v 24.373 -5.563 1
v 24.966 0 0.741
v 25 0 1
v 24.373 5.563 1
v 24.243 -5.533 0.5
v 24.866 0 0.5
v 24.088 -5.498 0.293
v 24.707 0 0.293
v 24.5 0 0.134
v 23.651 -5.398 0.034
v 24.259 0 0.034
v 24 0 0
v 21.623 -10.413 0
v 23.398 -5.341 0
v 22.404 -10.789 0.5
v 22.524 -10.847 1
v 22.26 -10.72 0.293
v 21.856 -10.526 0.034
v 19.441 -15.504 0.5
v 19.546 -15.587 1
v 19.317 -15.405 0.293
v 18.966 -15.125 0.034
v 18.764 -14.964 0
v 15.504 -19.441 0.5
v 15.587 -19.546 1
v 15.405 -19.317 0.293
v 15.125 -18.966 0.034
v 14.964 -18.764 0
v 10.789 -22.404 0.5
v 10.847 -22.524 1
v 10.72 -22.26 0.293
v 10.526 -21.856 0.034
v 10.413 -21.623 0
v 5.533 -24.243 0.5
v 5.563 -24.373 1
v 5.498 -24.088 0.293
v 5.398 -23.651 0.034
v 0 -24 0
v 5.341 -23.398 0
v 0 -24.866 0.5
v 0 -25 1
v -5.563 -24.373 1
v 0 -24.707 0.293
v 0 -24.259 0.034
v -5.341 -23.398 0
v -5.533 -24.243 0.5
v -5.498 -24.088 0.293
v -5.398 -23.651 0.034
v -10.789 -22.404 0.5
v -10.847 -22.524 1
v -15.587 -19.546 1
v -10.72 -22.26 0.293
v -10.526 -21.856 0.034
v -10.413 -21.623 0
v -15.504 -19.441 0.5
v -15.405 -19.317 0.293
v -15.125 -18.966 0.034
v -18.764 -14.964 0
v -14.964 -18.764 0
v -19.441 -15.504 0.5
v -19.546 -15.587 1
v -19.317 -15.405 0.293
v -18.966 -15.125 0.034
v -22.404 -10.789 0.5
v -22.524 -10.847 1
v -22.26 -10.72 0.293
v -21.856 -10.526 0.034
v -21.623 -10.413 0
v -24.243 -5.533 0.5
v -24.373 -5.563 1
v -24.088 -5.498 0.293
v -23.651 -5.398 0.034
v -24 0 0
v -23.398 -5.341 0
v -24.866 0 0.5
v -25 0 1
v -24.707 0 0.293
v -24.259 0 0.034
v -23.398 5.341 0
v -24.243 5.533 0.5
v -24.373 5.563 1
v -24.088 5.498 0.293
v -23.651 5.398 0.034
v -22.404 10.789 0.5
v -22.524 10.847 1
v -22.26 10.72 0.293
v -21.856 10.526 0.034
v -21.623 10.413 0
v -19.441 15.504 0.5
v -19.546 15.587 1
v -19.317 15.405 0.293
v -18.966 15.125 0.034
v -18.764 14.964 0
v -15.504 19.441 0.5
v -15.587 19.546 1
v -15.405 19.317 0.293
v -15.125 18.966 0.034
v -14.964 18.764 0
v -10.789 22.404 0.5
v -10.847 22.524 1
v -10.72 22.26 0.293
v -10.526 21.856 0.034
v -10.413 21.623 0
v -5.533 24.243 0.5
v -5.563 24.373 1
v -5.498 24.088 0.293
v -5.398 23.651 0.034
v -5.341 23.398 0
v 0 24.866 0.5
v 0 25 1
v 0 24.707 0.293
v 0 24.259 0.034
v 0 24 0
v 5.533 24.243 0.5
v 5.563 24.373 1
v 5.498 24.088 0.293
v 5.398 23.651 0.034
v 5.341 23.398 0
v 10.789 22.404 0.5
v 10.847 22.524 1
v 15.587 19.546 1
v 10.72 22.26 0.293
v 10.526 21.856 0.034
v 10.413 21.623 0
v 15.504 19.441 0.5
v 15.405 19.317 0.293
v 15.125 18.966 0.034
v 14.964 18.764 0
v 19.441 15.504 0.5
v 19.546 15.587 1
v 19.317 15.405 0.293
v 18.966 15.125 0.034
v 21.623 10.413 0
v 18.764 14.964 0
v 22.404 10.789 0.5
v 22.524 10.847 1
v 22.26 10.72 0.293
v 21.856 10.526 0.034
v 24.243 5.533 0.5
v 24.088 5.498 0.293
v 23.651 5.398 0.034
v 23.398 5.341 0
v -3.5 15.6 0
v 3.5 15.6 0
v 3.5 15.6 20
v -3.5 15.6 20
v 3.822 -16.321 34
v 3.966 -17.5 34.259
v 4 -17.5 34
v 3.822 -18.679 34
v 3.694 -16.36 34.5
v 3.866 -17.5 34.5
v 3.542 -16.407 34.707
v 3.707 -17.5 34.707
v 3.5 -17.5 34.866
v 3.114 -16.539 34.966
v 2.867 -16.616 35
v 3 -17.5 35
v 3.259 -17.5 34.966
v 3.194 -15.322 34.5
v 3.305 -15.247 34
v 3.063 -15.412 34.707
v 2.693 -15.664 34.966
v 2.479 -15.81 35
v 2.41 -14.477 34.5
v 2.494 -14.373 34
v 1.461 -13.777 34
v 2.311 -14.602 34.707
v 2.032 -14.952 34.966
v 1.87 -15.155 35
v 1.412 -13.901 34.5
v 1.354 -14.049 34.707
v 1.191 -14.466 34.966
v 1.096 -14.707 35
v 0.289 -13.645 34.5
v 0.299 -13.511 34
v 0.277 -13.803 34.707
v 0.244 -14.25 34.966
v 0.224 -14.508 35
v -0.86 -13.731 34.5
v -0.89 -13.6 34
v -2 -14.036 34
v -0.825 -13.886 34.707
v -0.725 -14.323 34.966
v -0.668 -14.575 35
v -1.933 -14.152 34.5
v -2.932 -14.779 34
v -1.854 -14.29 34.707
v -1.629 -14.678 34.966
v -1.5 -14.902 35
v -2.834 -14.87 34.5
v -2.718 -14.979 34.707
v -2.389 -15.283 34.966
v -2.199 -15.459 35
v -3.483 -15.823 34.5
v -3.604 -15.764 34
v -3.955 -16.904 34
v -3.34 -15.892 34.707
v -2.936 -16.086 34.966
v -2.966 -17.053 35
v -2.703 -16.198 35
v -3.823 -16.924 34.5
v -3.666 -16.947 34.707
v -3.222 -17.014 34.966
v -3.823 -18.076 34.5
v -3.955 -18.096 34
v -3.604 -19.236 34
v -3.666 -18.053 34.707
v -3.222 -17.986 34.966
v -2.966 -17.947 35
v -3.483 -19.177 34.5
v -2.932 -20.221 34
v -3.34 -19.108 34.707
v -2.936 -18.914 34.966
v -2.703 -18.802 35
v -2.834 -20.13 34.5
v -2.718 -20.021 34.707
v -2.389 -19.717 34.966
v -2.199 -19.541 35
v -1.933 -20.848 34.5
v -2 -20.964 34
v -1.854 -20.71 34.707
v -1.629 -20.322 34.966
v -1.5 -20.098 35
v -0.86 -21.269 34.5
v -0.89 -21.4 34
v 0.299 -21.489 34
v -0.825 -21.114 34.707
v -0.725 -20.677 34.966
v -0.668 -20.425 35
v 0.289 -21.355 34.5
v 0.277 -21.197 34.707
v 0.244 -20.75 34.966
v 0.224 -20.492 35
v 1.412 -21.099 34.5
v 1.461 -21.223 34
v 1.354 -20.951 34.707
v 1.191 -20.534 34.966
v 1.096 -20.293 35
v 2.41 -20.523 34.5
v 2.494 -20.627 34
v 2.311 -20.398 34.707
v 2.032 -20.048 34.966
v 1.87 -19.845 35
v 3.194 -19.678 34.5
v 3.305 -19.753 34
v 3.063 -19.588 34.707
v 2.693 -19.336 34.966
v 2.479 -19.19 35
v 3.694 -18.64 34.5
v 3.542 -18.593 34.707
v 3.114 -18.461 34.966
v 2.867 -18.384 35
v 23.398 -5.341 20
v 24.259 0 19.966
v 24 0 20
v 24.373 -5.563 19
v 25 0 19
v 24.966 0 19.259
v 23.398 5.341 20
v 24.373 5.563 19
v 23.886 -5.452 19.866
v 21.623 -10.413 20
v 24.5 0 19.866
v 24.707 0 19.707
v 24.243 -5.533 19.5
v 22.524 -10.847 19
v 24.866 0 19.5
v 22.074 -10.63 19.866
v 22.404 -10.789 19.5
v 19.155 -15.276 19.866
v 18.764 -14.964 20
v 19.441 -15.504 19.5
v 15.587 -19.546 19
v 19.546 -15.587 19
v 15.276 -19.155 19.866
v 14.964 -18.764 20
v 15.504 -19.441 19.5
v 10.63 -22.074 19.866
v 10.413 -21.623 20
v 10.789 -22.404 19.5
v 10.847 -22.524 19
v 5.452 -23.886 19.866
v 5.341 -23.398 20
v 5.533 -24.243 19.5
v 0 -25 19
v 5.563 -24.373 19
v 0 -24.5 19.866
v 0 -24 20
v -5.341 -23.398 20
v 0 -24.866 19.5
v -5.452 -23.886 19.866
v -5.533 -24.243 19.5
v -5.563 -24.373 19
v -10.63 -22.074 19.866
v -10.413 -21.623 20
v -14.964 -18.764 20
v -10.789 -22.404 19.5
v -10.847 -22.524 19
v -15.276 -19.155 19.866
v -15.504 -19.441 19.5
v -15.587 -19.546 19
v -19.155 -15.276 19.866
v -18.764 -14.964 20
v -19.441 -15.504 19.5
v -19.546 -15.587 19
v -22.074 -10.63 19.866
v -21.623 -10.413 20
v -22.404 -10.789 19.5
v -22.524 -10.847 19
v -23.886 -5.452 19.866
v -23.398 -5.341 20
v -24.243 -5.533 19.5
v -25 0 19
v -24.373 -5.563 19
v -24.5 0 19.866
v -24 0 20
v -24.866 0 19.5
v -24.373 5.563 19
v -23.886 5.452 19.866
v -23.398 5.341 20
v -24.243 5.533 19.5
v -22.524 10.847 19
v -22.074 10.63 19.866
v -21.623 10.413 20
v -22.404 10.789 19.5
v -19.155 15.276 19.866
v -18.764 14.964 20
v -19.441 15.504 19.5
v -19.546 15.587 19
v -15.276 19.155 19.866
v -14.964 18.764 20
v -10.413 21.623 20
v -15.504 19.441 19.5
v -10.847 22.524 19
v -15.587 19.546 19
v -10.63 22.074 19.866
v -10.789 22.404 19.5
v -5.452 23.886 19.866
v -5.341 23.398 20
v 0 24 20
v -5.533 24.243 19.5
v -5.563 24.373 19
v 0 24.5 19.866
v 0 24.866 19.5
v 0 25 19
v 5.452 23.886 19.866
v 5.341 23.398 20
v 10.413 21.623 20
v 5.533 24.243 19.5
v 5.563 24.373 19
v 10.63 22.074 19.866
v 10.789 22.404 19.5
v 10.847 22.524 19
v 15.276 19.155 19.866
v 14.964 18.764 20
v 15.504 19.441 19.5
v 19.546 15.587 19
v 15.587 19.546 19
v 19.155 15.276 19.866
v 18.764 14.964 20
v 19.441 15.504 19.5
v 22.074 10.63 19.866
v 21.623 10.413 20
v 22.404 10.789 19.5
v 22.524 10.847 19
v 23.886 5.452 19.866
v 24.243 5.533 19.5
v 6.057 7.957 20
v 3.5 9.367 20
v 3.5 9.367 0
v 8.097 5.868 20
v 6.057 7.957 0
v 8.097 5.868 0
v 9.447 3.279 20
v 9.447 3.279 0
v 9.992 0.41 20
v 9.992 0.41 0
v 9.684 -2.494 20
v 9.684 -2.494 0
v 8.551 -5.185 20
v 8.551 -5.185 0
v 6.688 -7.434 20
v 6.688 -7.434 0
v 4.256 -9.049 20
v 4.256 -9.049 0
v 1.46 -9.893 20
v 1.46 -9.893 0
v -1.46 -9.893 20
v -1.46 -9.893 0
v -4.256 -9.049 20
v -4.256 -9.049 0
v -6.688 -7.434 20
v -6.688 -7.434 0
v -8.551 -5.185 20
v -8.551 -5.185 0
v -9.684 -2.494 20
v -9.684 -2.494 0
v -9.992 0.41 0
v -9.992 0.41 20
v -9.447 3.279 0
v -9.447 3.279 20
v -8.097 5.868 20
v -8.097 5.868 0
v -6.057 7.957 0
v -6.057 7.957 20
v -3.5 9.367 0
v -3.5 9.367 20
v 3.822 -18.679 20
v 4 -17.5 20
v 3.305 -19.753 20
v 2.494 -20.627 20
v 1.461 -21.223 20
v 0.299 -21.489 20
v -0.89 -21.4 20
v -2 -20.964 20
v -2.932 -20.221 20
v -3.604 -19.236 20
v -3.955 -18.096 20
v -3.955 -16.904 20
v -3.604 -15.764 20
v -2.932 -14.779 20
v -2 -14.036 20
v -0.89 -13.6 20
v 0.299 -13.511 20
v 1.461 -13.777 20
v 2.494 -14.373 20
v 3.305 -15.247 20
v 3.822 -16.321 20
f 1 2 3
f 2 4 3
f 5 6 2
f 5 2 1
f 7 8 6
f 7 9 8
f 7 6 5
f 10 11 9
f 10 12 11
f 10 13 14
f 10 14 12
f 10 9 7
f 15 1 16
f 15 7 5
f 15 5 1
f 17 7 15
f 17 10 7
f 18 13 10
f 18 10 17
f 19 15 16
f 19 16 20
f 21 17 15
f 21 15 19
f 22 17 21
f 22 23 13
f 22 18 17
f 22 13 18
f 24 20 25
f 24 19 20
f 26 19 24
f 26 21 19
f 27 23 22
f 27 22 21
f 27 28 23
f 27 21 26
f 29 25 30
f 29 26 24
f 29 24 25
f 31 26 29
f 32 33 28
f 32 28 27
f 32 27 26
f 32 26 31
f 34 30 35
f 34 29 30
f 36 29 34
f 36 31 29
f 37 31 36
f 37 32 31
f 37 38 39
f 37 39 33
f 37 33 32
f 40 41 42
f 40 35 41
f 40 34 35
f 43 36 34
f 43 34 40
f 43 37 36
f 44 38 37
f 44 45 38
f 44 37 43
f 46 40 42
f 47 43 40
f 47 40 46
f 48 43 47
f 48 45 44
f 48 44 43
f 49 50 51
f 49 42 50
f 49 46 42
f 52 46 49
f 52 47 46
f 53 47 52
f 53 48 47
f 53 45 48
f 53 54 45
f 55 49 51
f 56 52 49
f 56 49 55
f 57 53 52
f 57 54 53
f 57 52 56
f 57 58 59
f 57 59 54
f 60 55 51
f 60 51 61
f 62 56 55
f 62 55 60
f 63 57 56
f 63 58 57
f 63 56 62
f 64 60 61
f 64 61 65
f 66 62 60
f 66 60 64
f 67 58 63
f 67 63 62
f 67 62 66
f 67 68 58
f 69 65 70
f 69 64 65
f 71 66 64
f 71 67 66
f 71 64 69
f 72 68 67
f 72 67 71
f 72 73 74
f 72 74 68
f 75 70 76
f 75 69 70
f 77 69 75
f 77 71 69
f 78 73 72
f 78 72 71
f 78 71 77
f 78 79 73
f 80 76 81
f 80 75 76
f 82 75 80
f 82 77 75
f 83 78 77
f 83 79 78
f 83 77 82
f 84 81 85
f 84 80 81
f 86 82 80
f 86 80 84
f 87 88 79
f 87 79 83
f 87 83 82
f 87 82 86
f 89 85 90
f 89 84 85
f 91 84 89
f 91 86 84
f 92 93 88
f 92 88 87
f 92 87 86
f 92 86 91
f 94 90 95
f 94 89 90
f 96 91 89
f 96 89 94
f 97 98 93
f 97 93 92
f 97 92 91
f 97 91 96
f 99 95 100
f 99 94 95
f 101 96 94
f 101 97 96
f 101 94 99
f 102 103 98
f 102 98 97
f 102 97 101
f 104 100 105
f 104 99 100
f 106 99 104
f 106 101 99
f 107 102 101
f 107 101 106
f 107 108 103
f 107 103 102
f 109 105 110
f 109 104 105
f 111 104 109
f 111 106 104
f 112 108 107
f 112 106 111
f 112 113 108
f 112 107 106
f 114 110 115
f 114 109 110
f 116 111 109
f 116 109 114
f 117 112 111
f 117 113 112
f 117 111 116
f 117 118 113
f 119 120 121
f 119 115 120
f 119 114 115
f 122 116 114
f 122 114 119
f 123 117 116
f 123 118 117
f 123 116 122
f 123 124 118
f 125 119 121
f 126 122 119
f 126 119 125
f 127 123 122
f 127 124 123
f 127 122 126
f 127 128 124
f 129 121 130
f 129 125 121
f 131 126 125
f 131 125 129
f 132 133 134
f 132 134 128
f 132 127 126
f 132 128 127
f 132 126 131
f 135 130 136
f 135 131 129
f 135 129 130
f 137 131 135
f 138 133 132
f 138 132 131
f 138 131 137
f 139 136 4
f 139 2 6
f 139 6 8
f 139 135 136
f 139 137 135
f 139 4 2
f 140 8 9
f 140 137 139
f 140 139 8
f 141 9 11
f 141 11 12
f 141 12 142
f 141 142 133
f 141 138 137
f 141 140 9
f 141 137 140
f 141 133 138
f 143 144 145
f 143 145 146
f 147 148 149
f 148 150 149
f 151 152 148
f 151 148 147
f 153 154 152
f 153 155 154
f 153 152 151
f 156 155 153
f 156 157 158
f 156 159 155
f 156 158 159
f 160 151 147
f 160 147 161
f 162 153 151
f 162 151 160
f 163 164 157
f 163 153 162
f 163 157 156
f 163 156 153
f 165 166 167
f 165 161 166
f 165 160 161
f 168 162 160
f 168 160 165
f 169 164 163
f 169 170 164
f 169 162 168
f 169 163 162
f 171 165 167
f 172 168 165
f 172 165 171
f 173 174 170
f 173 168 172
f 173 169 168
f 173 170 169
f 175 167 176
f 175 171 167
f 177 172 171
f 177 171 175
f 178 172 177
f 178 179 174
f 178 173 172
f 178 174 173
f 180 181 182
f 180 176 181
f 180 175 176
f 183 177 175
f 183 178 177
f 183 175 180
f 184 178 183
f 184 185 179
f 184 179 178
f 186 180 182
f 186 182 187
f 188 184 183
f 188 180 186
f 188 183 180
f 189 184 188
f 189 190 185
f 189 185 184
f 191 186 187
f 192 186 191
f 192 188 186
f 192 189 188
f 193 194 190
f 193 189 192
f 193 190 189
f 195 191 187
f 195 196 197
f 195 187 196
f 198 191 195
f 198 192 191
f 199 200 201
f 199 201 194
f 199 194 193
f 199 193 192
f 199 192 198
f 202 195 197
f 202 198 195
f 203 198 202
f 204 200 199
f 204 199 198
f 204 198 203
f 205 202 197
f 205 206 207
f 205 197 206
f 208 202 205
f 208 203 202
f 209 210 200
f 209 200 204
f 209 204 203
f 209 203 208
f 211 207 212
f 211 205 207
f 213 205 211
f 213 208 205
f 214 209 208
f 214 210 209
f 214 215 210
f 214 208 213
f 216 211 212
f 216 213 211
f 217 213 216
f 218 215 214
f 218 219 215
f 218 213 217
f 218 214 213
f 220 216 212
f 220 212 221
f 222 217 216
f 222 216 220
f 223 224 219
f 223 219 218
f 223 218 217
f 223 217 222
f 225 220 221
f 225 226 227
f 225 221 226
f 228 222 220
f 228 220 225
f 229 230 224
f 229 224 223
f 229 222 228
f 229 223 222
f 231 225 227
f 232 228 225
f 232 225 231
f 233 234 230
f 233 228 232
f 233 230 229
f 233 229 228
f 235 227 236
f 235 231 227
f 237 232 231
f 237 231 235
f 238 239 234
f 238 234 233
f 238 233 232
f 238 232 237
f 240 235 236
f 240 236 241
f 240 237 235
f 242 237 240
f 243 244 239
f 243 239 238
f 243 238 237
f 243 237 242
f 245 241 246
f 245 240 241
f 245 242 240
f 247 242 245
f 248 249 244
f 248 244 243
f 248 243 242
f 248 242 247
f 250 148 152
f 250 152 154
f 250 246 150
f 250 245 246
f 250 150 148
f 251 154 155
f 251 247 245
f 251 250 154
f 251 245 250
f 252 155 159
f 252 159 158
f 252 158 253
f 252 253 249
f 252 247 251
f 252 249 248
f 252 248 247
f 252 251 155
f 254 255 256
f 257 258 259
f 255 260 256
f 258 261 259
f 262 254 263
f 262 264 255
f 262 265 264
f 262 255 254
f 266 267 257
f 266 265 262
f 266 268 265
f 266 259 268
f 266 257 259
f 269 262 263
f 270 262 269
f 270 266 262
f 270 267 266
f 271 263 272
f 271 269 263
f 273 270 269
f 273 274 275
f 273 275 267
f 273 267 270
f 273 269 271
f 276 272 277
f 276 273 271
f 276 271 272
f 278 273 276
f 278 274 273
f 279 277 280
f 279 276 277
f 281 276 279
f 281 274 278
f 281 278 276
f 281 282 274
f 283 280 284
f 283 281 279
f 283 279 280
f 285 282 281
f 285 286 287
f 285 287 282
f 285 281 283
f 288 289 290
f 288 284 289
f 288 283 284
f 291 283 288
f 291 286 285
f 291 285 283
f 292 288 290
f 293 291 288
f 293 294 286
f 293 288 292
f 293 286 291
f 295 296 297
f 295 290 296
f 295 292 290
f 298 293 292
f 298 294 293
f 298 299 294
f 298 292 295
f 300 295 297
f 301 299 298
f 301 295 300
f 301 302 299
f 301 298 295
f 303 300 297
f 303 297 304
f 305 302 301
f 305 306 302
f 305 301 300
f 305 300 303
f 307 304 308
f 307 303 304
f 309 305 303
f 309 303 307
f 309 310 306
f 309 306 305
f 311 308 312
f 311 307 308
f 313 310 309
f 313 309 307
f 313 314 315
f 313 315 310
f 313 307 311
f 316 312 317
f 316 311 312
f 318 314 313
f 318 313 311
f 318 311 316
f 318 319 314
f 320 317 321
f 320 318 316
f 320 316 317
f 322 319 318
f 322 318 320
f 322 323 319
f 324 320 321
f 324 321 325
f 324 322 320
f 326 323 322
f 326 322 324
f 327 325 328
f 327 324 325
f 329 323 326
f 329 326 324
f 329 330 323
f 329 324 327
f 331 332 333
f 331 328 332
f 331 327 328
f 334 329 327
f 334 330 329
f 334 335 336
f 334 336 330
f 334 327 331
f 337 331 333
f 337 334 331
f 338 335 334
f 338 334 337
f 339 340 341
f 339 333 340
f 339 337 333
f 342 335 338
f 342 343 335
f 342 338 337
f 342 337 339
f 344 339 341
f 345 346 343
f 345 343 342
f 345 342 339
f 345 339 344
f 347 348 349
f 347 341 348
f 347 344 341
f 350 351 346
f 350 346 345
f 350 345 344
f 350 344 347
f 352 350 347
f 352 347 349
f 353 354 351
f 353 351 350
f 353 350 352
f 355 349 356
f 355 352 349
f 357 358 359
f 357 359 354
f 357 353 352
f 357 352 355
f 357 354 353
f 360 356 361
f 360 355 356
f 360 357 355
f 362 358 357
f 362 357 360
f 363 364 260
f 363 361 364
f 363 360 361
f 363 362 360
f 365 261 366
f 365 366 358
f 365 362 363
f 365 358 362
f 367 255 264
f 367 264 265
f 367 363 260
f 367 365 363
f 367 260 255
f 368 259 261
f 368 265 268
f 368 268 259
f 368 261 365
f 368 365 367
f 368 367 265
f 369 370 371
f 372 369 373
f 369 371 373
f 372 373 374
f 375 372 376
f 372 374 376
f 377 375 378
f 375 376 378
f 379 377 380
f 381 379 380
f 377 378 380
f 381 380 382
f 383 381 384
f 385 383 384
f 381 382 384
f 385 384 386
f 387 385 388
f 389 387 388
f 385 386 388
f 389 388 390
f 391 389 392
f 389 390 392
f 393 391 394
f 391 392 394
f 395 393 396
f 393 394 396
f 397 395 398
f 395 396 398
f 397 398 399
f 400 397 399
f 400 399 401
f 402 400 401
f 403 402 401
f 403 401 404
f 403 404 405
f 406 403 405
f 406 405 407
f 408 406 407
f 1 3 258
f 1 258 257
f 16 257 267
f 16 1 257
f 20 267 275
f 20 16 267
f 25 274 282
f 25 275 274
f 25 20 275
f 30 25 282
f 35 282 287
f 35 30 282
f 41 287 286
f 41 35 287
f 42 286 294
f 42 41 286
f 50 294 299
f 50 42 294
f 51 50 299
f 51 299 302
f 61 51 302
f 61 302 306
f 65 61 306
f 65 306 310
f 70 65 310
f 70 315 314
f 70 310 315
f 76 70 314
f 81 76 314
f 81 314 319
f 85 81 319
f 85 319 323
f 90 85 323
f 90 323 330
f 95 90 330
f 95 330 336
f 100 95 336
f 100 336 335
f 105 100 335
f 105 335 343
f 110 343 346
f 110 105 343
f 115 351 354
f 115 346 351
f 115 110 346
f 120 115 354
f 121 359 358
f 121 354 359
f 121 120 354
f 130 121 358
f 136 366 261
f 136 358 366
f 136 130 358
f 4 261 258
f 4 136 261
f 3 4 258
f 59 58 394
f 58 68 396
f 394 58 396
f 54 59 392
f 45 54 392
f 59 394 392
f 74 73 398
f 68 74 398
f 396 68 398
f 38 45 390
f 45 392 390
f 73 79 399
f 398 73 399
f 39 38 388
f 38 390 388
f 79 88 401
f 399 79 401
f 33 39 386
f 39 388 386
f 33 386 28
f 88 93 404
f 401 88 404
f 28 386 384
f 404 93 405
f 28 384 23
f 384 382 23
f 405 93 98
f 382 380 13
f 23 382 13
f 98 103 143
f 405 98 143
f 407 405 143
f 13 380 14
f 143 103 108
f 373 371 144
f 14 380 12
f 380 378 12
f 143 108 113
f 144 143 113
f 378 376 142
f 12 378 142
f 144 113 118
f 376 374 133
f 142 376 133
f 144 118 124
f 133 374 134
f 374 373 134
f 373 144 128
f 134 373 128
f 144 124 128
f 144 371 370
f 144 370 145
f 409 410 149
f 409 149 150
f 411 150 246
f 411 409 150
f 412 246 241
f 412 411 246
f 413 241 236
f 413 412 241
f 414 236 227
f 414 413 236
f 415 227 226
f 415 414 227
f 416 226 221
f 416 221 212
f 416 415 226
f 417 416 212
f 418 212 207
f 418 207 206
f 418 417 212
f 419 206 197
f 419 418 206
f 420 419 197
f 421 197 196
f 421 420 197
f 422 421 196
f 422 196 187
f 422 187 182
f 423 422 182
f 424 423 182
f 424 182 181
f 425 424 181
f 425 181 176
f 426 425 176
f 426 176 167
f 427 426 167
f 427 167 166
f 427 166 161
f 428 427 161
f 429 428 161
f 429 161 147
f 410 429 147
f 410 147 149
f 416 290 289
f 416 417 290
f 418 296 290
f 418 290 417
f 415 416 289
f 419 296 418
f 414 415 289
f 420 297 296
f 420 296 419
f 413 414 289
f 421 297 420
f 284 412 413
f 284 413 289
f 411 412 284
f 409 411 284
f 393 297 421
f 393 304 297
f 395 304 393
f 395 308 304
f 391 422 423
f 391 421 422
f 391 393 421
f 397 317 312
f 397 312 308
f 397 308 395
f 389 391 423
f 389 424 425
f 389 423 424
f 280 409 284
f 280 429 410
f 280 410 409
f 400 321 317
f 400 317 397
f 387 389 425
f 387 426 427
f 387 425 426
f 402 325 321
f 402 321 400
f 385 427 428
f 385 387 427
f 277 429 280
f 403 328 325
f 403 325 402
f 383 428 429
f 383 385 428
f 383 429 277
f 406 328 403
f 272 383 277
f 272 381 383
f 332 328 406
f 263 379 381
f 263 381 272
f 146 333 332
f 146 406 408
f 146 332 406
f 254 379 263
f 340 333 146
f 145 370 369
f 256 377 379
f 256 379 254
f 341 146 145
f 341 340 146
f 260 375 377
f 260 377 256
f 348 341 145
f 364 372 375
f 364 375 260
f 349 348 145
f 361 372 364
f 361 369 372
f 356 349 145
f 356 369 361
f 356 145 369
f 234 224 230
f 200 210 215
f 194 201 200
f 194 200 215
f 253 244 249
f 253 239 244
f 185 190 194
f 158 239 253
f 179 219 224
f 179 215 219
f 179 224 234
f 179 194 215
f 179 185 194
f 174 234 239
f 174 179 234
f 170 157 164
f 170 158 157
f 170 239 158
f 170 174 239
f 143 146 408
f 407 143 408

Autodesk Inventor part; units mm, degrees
ref_plane "YZ Plane" through (0, 0, 0) normal (1, 0, 0) x (0, 1, 0)
ref_plane "XZ Plane" through (0, 0, 0) normal (0, 1, 0) x (-1, 0, 0)
ref_plane "XY Plane" through (0, 0, 0) normal (0, 0, 1) x (1, 0, 0)
sketch "Boceto1" plane through (0, 0, 0) normal (0, 0, 1) x (1, 0, 0)
  circle A0 centre (0, 0) radius 25
  circle A1 centre (0, 0) radius 10
  line L0 (0, -25) -> (0, -17.5)
  circle A2 centre (0, -17.5) radius 4
  dimension "d0" = 50
  dimension "d1" = 20
  dimension "d3" = 7.5
  dimension "d4" = 8
extrude "Extrusión1" add sketch "Boceto1" along normal blind 35 contours A2
extrude "Extrusión2" add sketch "Boceto1" along normal blind 20
fillet "Empalme1" radius 1 3 edges at (-25, 0, 0) (-25, 0, 20) (-4, -17.5, 35)
sketch "Boceto3" plane through (0, 0, 20) normal (0, 0, 1) x (1, 0, 0)
  line L0 (0, 15.6) -> (-3.5, 15.6)
  line L1 (-3.5, 15.6) -> (-3.5, 5.6)
  line L2 (-3.5, 5.6) -> (3.5, 5.6)
  line L3 (3.5, 5.6) -> (3.5, 15.6)
  line L4 (3.5, 15.6) -> (0, 15.6)
  point P0 (0, 0)
  dimension "d18" = 15.6
  dimension "d19" = 3.5
  dimension "d20" = 10
  dimension "d21" = 7
extrude "Extrusión4" cut sketch "Boceto3" against normal through all
properties part number "PIEZA PARA GIRAR"
